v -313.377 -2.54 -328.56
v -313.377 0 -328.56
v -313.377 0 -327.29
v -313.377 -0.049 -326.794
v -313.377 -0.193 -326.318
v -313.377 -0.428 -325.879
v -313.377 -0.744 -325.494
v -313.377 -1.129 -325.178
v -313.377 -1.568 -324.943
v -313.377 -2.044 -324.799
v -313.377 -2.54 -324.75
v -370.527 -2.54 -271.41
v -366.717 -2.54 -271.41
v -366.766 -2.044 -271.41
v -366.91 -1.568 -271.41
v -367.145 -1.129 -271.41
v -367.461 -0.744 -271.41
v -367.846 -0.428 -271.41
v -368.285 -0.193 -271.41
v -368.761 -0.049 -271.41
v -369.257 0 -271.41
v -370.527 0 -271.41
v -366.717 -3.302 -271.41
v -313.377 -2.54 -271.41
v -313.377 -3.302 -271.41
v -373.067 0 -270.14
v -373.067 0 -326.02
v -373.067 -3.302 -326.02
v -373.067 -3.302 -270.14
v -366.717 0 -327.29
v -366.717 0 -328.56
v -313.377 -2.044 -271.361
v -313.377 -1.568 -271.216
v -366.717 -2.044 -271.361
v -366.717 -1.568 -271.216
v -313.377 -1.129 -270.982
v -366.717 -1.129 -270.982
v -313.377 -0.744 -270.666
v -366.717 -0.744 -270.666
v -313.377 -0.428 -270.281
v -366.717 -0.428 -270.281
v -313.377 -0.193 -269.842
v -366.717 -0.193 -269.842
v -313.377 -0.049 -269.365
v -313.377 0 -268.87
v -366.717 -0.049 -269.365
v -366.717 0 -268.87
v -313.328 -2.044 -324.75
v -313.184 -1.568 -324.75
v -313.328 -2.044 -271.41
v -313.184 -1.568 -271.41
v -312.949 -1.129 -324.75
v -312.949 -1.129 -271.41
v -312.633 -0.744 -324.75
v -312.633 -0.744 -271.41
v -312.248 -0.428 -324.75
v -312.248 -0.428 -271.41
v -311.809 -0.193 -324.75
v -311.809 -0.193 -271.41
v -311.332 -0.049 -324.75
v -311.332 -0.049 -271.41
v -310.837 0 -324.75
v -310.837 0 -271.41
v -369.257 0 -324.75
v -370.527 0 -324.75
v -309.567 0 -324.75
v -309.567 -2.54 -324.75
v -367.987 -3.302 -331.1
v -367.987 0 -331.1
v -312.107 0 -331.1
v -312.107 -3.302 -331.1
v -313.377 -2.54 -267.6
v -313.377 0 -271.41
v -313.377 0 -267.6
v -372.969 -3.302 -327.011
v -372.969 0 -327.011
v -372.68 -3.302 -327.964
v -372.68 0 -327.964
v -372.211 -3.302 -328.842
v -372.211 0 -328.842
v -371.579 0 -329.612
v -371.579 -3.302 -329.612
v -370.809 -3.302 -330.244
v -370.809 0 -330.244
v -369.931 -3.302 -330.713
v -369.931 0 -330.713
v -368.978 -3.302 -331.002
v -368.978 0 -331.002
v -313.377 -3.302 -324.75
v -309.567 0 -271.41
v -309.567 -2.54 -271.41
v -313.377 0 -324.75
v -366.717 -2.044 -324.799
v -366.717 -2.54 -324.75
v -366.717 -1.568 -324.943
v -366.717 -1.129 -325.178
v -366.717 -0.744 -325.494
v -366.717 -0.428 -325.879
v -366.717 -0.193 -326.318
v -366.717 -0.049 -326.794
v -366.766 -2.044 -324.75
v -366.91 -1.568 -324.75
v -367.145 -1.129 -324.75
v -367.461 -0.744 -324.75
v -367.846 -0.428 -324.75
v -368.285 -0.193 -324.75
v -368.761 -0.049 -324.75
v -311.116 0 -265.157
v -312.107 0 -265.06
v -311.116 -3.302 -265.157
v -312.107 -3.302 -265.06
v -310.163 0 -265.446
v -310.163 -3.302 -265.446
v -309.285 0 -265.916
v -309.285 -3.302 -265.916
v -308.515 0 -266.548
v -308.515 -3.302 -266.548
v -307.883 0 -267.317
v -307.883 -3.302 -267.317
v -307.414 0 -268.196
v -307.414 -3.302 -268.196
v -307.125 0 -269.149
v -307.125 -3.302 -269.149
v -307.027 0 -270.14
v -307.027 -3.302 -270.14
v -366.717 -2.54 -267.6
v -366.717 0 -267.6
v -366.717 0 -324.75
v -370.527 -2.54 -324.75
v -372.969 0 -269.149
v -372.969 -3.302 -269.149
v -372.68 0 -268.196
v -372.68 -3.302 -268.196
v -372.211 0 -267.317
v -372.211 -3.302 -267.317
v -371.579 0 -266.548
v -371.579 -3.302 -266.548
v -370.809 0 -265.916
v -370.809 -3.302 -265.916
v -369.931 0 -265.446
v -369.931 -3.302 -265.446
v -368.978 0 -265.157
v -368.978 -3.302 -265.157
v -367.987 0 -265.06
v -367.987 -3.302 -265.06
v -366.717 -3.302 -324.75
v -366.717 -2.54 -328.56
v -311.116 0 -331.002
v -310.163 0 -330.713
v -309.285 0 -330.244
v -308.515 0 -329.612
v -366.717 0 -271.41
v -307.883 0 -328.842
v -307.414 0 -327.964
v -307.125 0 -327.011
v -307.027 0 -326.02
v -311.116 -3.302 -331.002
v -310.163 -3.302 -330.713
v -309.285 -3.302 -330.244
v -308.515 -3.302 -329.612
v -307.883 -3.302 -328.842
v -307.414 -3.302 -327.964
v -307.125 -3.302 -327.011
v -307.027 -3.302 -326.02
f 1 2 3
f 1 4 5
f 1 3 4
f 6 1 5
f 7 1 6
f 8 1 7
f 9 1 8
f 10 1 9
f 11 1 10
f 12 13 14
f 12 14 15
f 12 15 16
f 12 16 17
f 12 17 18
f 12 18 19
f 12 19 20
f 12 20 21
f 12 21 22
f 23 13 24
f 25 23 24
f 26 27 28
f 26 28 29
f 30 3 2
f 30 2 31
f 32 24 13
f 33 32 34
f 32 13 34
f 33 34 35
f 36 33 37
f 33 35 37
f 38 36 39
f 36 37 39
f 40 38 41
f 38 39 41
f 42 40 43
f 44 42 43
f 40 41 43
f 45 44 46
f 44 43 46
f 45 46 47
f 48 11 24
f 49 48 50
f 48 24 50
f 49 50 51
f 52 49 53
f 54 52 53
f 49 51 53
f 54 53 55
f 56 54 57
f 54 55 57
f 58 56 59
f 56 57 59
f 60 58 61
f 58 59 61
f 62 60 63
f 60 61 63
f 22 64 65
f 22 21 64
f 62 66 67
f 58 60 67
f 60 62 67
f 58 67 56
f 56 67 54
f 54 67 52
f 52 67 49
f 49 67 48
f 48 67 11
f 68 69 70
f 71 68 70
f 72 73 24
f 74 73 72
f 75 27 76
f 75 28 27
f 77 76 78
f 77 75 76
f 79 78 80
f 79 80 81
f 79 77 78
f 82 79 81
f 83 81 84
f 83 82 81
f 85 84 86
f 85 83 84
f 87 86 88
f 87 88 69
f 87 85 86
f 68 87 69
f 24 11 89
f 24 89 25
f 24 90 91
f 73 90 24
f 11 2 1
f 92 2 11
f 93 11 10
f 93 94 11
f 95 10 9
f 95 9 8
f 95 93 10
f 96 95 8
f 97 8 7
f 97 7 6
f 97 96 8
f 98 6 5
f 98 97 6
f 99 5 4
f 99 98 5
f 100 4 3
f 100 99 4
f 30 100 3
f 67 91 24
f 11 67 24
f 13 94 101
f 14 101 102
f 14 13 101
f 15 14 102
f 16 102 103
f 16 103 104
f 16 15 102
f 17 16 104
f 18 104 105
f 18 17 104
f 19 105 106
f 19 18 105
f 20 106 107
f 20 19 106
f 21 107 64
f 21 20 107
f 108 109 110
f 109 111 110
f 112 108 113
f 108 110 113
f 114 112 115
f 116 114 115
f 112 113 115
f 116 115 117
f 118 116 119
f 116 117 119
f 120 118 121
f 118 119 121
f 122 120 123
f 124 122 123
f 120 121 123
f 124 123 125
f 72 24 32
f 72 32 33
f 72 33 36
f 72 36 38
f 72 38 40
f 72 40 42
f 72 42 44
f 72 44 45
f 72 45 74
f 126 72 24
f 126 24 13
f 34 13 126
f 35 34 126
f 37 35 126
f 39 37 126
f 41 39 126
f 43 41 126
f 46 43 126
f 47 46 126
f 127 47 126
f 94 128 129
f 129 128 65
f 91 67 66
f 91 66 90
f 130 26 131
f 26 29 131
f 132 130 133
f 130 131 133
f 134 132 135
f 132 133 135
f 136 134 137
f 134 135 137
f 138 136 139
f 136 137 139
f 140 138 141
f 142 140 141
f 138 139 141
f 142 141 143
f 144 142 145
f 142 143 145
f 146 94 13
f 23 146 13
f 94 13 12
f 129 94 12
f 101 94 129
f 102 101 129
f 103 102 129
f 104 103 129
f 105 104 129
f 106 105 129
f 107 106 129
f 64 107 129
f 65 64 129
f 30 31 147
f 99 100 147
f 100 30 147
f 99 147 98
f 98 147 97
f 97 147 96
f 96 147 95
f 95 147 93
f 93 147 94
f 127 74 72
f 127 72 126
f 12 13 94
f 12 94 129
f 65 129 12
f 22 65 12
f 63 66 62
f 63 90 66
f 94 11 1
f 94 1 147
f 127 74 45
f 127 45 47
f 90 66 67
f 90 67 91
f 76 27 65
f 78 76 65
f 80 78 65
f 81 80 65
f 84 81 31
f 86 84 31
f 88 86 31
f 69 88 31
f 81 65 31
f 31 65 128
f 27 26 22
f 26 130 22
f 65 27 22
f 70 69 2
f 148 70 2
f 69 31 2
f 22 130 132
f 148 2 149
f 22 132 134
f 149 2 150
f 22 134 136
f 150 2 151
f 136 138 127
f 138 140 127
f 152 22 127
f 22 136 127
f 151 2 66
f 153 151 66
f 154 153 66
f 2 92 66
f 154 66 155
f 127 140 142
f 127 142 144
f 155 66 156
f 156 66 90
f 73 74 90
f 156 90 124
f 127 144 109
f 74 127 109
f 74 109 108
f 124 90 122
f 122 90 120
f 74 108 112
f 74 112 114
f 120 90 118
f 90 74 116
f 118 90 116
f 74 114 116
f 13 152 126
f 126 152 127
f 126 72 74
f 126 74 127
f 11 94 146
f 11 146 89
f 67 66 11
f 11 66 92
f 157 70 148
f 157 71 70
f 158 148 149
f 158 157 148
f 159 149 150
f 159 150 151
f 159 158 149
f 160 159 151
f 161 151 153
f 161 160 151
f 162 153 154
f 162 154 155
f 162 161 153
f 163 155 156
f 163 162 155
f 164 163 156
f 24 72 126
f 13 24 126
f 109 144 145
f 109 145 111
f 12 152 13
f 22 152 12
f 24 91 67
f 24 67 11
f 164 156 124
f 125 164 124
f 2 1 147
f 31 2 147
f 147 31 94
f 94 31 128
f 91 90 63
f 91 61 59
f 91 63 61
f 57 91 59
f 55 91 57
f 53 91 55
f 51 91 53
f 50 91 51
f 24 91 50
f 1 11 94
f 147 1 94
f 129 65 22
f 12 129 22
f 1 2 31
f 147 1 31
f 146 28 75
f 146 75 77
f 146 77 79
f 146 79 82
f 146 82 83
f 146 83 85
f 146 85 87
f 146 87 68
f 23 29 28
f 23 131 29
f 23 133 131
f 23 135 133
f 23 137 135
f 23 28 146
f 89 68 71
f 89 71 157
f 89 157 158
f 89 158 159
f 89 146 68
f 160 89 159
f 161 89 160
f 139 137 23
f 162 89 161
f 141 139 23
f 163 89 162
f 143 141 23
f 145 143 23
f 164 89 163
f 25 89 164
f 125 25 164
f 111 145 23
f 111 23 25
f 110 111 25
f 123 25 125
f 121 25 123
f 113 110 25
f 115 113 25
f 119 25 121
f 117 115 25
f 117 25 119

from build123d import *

# Parameters (mm, degrees)
F0_W     = 66.04
F0_H     = 66.04
F0_W_2   = 53.34
F0_H_2   = 53.34
F1_DEPTH = 3.302
F2_R     = 5.08
F3_W     = 53.34
F3_H     = 3.81
F3_W_2   = 3.81
F3_H_2   = 53.34
F4_DEPTH = 2.54
F6_W     = 53.34
F6_H     = 3.81
F9_DEPTH = 2.54
F5_W     = 3.81
F5_H     = 53.34
F8_W     = 53.34
F8_H     = 3.81
F7_W     = 3.81
F7_H     = 53.34
F10_R    = 2.53999
F10_2_R  = 2.53999
F10_3_R  = 2.53999
F10_4_R  = 2.53999


# Not quite as in the source:
# - a fillet or chamfer is up to 0.001 mm smaller than in the source, because OpenCascade refuses the exact size


with BuildPart() as f1:
    # F0 (on Front) → F1 (new body)
    with BuildSketch(Plane.XZ):
        with Locations((-340.0468912915, -298.0797665718)):
            Rectangle(F0_W, F0_H)
        with Locations((-340.0468912915, -298.0797665718)):
            Rectangle(F0_W_2, F0_H_2, mode=Mode.SUBTRACT)
    extrude(amount=F1_DEPTH)

    # F2
    f2_edges = [f1.edges().sort_by_distance(p)[0] for p in [
        (-307.026891, -1.651, -331.099767),
        (-373.066891, -1.651, -331.099767),
        (-373.066891, -1.651, -265.059767),
        (-307.026891, -1.651, -265.059767),
    ]]
    fillet(f2_edges, radius=F2_R)

    # F3 (on face) → F4 (cut)
    with BuildSketch(Plane(origin=(0, 0, 0), x_dir=(-1, 0, 0), z_dir=(0, 1, 0))):
        with Locations((340.0468912915, -326.6547665718)):
            Rectangle(F3_W, F3_H)
        with Locations((368.6218912915, -298.0797665718)):
            Rectangle(F3_W_2, F3_H_2)
        with Locations((340.0468912915, -269.5047665718)):
            Rectangle(F3_W, F3_H)
        with Locations((311.4718912915, -298.0797665718)):
            Rectangle(F3_W_2, F3_H_2)
    extrude(amount=-F4_DEPTH, mode=Mode.SUBTRACT)


with BuildPart() as f9:
    # F6 (on face) → F9 (new body)
    with BuildSketch(Plane(origin=(0, -2.54, 0), x_dir=(-1, 0, 0), z_dir=(0, 1, 0))):
        with Locations((340.0468912915, -326.6547665718)):
            Rectangle(F6_W, F6_H)
    extrude(amount=F9_DEPTH)

    # F10#2 (radius 2.54 in the source; OpenCascade refuses exactly that, so slightly less here)
    f10_2_edges = [f9.edges().sort_by_distance(p)[0] for p in [
        (-340.046891, 0, -324.749767),
    ]]
    fillet(f10_2_edges, radius=F10_2_R)


with BuildPart() as f9b:
    # F5 (on face) → F9, piece 2 (new body)
    with BuildSketch(Plane(origin=(0, -2.54, 0), x_dir=(-1, 0, 0), z_dir=(0, 1, 0))):
        with Locations((311.4718912915, -298.0797665718)):
            Rectangle(F5_W, F5_H)
    extrude(amount=F9_DEPTH)

    # F10 (radius 2.54 in the source; OpenCascade refuses exactly that, so slightly less here)
    f10_edges = [f9b.edges().sort_by_distance(p)[0] for p in [
        (-313.376891, 0, -298.079767),
    ]]
    fillet(f10_edges, radius=F10_R)


with BuildPart() as f9c:
    # F8 (on face) → F9, piece 3 (new body)
    with BuildSketch(Plane(origin=(0, -2.54, 0), x_dir=(-1, 0, 0), z_dir=(0, 1, 0))):
        with Locations((340.0468912915, -269.5047665718)):
            Rectangle(F8_W, F8_H)
    extrude(amount=F9_DEPTH)

    # F10#4 (radius 2.54 in the source; OpenCascade refuses exactly that, so slightly less here)
    f10_4_edges = [f9c.edges().sort_by_distance(p)[0] for p in [
        (-340.046891, 0, -271.409767),
    ]]
    fillet(f10_4_edges, radius=F10_4_R)


with BuildPart() as f9d:
    # F7 (on face) → F9, piece 4 (new body)
    with BuildSketch(Plane(origin=(0, -2.54, 0), x_dir=(-1, 0, 0), z_dir=(0, 1, 0))):
        with Locations((368.6218912915, -298.0797665718)):
            Rectangle(F7_W, F7_H)
    extrude(amount=F9_DEPTH)

    # F10#3 (radius 2.54 in the source; OpenCascade refuses exactly that, so slightly less here)
    f10_3_edges = [f9d.edges().sort_by_distance(p)[0] for p in [
        (-366.716891, 0, -298.079767),
    ]]
    fillet(f10_3_edges, radius=F10_3_R)


solid = Compound([f1.part, f9.part, f9b.part, f9c.part, f9d.part])
